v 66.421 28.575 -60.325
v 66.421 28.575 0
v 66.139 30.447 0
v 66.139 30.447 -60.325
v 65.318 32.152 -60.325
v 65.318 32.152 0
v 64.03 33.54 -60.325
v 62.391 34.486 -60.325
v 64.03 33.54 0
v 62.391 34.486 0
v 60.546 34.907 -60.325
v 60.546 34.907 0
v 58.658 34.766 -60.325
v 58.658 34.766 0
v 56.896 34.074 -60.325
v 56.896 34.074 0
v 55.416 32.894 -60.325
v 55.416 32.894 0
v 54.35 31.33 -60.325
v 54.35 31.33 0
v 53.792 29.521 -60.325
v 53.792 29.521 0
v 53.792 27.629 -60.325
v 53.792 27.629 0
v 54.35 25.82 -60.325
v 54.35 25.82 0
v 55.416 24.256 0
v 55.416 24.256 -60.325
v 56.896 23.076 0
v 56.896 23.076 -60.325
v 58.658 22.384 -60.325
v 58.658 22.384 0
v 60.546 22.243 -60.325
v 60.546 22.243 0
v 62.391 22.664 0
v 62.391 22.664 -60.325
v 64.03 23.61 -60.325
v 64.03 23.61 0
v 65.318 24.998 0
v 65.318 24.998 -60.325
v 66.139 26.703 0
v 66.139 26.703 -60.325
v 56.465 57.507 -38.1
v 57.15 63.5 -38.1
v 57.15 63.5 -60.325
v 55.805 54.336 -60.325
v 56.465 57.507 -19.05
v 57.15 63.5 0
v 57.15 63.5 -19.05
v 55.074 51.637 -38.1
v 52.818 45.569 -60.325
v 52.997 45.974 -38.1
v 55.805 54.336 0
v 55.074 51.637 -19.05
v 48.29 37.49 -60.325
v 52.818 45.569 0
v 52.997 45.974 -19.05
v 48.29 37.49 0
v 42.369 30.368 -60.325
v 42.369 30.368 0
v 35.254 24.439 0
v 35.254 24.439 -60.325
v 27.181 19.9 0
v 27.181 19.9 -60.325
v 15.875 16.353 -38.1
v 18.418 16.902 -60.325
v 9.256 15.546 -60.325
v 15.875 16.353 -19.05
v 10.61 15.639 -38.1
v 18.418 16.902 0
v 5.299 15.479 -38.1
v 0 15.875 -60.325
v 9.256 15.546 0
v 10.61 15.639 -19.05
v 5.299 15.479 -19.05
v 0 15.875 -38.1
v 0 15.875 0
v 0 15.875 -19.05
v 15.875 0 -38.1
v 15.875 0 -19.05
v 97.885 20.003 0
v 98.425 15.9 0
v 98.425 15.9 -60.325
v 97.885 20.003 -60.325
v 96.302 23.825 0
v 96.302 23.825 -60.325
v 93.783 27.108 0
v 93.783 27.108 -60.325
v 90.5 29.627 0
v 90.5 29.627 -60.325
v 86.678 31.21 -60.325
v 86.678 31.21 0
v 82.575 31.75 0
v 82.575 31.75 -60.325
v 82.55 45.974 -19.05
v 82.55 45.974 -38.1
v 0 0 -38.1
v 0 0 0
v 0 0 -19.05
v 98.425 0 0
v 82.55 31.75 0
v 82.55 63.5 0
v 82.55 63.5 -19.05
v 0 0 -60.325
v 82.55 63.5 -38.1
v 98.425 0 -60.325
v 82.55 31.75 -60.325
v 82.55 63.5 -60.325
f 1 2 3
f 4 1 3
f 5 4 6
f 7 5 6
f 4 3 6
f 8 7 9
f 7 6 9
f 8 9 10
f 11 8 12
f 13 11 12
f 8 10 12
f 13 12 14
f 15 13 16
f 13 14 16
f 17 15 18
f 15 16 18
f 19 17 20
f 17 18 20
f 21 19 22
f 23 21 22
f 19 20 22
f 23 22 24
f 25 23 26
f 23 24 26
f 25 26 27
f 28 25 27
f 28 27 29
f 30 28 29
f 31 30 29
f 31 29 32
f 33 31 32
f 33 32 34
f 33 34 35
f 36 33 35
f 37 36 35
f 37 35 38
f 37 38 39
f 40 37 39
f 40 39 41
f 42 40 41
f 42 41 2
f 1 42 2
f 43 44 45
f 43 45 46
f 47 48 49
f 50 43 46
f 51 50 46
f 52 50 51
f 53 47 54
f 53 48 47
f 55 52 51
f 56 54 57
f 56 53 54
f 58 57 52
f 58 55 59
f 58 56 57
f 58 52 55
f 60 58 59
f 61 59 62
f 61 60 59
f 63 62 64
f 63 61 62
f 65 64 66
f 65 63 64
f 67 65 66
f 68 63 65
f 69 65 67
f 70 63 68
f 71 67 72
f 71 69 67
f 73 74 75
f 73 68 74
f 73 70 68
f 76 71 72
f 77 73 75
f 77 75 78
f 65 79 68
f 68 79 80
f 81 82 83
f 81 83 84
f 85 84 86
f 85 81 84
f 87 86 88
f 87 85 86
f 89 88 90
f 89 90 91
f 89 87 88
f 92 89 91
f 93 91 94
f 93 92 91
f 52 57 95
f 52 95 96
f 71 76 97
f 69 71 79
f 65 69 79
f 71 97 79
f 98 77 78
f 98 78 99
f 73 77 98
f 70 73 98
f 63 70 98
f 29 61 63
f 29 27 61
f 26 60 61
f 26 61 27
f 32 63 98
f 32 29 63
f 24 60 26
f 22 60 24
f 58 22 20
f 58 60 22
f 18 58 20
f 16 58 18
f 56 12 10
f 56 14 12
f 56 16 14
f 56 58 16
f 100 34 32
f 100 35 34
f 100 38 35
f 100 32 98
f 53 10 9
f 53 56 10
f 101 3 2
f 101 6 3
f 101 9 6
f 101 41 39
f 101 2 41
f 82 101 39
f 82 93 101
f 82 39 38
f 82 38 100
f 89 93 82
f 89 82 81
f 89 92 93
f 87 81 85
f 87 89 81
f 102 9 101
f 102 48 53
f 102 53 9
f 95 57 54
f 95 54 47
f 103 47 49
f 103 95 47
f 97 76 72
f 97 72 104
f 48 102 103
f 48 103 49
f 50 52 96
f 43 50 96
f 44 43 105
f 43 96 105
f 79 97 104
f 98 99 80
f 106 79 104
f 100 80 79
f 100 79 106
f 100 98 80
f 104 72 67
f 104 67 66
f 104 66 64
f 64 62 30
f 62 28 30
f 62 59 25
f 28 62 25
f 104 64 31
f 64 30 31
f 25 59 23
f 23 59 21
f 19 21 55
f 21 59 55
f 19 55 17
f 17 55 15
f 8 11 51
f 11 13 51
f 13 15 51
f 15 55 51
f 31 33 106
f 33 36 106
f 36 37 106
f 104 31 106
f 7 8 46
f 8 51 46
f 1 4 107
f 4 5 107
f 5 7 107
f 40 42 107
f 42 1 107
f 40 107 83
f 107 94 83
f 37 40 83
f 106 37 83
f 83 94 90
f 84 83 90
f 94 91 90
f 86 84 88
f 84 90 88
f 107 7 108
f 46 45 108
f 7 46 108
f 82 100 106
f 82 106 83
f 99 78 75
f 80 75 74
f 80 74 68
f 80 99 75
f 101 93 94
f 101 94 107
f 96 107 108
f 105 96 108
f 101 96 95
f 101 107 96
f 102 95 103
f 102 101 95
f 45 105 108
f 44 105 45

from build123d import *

# Parameters (mm, degrees)
BOSS_EXTRUDE1_DEPTH = 60.325
SKETCH2_W           = 19.05
SKETCH2_H           = 17.526
CUT_EXTRUDE1_DEPTH  = 29.8196
SKETCH3_W           = 15.875
SKETCH3_H           = 19.05
CUT_EXTRUDE2_DEPTH  = 29.8196
SKETCH4_R           = 6.35
CUT_EXTRUDE3_DEPTH  = 60.3504


with BuildPart() as part:
    # Sketch1 → Boss-Extrude1 (new body)
    with BuildSketch(Plane.XY):
        with BuildLine():
            Line((0, 0), (82.55, 0))
            Line((82.55, 0), (98.425, 0))
            Line((98.425, 0), (98.425, 15.9004))
            ThreePointArc((98.425, 15.9004), (93.782759639, 27.107759639), (82.5754, 31.75))
            Line((82.5754, 31.75), (82.55, 31.75))
            Line((82.55, 31.75), (82.55, 63.5))
            Line((82.55, 63.5), (57.15, 63.5))
            ThreePointArc((57.15, 63.5), (38.947337741, 27.240694711), (0, 15.875))
            Line((0, 15.875), (0, 0))
        make_face()
    extrude(amount=-BOSS_EXTRUDE1_DEPTH)

    # Sketch2 → Cut-Extrude1 (cut)
    with BuildSketch(Plane(origin=(82.55, 0, 0), x_dir=(0, 0, -1), z_dir=(1, 0, 0))):
        with Locations((28.575, 54.737)):
            Rectangle(SKETCH2_W, SKETCH2_H)
    extrude(amount=-CUT_EXTRUDE1_DEPTH, mode=Mode.SUBTRACT)

    # Sketch3 → Cut-Extrude2 (cut)
    with BuildSketch(Plane.XZ):
        with Locations((7.9375, -28.575)):
            Rectangle(SKETCH3_W, SKETCH3_H)
    extrude(amount=-CUT_EXTRUDE2_DEPTH, mode=Mode.SUBTRACT)

    # Sketch4 → Cut-Extrude3 (cut)
    with BuildSketch(Plane.XY):
        with Locations((60.071, 28.575)):
            Circle(SKETCH4_R)
    extrude(amount=-CUT_EXTRUDE3_DEPTH, mode=Mode.SUBTRACT)


solid = part.part
